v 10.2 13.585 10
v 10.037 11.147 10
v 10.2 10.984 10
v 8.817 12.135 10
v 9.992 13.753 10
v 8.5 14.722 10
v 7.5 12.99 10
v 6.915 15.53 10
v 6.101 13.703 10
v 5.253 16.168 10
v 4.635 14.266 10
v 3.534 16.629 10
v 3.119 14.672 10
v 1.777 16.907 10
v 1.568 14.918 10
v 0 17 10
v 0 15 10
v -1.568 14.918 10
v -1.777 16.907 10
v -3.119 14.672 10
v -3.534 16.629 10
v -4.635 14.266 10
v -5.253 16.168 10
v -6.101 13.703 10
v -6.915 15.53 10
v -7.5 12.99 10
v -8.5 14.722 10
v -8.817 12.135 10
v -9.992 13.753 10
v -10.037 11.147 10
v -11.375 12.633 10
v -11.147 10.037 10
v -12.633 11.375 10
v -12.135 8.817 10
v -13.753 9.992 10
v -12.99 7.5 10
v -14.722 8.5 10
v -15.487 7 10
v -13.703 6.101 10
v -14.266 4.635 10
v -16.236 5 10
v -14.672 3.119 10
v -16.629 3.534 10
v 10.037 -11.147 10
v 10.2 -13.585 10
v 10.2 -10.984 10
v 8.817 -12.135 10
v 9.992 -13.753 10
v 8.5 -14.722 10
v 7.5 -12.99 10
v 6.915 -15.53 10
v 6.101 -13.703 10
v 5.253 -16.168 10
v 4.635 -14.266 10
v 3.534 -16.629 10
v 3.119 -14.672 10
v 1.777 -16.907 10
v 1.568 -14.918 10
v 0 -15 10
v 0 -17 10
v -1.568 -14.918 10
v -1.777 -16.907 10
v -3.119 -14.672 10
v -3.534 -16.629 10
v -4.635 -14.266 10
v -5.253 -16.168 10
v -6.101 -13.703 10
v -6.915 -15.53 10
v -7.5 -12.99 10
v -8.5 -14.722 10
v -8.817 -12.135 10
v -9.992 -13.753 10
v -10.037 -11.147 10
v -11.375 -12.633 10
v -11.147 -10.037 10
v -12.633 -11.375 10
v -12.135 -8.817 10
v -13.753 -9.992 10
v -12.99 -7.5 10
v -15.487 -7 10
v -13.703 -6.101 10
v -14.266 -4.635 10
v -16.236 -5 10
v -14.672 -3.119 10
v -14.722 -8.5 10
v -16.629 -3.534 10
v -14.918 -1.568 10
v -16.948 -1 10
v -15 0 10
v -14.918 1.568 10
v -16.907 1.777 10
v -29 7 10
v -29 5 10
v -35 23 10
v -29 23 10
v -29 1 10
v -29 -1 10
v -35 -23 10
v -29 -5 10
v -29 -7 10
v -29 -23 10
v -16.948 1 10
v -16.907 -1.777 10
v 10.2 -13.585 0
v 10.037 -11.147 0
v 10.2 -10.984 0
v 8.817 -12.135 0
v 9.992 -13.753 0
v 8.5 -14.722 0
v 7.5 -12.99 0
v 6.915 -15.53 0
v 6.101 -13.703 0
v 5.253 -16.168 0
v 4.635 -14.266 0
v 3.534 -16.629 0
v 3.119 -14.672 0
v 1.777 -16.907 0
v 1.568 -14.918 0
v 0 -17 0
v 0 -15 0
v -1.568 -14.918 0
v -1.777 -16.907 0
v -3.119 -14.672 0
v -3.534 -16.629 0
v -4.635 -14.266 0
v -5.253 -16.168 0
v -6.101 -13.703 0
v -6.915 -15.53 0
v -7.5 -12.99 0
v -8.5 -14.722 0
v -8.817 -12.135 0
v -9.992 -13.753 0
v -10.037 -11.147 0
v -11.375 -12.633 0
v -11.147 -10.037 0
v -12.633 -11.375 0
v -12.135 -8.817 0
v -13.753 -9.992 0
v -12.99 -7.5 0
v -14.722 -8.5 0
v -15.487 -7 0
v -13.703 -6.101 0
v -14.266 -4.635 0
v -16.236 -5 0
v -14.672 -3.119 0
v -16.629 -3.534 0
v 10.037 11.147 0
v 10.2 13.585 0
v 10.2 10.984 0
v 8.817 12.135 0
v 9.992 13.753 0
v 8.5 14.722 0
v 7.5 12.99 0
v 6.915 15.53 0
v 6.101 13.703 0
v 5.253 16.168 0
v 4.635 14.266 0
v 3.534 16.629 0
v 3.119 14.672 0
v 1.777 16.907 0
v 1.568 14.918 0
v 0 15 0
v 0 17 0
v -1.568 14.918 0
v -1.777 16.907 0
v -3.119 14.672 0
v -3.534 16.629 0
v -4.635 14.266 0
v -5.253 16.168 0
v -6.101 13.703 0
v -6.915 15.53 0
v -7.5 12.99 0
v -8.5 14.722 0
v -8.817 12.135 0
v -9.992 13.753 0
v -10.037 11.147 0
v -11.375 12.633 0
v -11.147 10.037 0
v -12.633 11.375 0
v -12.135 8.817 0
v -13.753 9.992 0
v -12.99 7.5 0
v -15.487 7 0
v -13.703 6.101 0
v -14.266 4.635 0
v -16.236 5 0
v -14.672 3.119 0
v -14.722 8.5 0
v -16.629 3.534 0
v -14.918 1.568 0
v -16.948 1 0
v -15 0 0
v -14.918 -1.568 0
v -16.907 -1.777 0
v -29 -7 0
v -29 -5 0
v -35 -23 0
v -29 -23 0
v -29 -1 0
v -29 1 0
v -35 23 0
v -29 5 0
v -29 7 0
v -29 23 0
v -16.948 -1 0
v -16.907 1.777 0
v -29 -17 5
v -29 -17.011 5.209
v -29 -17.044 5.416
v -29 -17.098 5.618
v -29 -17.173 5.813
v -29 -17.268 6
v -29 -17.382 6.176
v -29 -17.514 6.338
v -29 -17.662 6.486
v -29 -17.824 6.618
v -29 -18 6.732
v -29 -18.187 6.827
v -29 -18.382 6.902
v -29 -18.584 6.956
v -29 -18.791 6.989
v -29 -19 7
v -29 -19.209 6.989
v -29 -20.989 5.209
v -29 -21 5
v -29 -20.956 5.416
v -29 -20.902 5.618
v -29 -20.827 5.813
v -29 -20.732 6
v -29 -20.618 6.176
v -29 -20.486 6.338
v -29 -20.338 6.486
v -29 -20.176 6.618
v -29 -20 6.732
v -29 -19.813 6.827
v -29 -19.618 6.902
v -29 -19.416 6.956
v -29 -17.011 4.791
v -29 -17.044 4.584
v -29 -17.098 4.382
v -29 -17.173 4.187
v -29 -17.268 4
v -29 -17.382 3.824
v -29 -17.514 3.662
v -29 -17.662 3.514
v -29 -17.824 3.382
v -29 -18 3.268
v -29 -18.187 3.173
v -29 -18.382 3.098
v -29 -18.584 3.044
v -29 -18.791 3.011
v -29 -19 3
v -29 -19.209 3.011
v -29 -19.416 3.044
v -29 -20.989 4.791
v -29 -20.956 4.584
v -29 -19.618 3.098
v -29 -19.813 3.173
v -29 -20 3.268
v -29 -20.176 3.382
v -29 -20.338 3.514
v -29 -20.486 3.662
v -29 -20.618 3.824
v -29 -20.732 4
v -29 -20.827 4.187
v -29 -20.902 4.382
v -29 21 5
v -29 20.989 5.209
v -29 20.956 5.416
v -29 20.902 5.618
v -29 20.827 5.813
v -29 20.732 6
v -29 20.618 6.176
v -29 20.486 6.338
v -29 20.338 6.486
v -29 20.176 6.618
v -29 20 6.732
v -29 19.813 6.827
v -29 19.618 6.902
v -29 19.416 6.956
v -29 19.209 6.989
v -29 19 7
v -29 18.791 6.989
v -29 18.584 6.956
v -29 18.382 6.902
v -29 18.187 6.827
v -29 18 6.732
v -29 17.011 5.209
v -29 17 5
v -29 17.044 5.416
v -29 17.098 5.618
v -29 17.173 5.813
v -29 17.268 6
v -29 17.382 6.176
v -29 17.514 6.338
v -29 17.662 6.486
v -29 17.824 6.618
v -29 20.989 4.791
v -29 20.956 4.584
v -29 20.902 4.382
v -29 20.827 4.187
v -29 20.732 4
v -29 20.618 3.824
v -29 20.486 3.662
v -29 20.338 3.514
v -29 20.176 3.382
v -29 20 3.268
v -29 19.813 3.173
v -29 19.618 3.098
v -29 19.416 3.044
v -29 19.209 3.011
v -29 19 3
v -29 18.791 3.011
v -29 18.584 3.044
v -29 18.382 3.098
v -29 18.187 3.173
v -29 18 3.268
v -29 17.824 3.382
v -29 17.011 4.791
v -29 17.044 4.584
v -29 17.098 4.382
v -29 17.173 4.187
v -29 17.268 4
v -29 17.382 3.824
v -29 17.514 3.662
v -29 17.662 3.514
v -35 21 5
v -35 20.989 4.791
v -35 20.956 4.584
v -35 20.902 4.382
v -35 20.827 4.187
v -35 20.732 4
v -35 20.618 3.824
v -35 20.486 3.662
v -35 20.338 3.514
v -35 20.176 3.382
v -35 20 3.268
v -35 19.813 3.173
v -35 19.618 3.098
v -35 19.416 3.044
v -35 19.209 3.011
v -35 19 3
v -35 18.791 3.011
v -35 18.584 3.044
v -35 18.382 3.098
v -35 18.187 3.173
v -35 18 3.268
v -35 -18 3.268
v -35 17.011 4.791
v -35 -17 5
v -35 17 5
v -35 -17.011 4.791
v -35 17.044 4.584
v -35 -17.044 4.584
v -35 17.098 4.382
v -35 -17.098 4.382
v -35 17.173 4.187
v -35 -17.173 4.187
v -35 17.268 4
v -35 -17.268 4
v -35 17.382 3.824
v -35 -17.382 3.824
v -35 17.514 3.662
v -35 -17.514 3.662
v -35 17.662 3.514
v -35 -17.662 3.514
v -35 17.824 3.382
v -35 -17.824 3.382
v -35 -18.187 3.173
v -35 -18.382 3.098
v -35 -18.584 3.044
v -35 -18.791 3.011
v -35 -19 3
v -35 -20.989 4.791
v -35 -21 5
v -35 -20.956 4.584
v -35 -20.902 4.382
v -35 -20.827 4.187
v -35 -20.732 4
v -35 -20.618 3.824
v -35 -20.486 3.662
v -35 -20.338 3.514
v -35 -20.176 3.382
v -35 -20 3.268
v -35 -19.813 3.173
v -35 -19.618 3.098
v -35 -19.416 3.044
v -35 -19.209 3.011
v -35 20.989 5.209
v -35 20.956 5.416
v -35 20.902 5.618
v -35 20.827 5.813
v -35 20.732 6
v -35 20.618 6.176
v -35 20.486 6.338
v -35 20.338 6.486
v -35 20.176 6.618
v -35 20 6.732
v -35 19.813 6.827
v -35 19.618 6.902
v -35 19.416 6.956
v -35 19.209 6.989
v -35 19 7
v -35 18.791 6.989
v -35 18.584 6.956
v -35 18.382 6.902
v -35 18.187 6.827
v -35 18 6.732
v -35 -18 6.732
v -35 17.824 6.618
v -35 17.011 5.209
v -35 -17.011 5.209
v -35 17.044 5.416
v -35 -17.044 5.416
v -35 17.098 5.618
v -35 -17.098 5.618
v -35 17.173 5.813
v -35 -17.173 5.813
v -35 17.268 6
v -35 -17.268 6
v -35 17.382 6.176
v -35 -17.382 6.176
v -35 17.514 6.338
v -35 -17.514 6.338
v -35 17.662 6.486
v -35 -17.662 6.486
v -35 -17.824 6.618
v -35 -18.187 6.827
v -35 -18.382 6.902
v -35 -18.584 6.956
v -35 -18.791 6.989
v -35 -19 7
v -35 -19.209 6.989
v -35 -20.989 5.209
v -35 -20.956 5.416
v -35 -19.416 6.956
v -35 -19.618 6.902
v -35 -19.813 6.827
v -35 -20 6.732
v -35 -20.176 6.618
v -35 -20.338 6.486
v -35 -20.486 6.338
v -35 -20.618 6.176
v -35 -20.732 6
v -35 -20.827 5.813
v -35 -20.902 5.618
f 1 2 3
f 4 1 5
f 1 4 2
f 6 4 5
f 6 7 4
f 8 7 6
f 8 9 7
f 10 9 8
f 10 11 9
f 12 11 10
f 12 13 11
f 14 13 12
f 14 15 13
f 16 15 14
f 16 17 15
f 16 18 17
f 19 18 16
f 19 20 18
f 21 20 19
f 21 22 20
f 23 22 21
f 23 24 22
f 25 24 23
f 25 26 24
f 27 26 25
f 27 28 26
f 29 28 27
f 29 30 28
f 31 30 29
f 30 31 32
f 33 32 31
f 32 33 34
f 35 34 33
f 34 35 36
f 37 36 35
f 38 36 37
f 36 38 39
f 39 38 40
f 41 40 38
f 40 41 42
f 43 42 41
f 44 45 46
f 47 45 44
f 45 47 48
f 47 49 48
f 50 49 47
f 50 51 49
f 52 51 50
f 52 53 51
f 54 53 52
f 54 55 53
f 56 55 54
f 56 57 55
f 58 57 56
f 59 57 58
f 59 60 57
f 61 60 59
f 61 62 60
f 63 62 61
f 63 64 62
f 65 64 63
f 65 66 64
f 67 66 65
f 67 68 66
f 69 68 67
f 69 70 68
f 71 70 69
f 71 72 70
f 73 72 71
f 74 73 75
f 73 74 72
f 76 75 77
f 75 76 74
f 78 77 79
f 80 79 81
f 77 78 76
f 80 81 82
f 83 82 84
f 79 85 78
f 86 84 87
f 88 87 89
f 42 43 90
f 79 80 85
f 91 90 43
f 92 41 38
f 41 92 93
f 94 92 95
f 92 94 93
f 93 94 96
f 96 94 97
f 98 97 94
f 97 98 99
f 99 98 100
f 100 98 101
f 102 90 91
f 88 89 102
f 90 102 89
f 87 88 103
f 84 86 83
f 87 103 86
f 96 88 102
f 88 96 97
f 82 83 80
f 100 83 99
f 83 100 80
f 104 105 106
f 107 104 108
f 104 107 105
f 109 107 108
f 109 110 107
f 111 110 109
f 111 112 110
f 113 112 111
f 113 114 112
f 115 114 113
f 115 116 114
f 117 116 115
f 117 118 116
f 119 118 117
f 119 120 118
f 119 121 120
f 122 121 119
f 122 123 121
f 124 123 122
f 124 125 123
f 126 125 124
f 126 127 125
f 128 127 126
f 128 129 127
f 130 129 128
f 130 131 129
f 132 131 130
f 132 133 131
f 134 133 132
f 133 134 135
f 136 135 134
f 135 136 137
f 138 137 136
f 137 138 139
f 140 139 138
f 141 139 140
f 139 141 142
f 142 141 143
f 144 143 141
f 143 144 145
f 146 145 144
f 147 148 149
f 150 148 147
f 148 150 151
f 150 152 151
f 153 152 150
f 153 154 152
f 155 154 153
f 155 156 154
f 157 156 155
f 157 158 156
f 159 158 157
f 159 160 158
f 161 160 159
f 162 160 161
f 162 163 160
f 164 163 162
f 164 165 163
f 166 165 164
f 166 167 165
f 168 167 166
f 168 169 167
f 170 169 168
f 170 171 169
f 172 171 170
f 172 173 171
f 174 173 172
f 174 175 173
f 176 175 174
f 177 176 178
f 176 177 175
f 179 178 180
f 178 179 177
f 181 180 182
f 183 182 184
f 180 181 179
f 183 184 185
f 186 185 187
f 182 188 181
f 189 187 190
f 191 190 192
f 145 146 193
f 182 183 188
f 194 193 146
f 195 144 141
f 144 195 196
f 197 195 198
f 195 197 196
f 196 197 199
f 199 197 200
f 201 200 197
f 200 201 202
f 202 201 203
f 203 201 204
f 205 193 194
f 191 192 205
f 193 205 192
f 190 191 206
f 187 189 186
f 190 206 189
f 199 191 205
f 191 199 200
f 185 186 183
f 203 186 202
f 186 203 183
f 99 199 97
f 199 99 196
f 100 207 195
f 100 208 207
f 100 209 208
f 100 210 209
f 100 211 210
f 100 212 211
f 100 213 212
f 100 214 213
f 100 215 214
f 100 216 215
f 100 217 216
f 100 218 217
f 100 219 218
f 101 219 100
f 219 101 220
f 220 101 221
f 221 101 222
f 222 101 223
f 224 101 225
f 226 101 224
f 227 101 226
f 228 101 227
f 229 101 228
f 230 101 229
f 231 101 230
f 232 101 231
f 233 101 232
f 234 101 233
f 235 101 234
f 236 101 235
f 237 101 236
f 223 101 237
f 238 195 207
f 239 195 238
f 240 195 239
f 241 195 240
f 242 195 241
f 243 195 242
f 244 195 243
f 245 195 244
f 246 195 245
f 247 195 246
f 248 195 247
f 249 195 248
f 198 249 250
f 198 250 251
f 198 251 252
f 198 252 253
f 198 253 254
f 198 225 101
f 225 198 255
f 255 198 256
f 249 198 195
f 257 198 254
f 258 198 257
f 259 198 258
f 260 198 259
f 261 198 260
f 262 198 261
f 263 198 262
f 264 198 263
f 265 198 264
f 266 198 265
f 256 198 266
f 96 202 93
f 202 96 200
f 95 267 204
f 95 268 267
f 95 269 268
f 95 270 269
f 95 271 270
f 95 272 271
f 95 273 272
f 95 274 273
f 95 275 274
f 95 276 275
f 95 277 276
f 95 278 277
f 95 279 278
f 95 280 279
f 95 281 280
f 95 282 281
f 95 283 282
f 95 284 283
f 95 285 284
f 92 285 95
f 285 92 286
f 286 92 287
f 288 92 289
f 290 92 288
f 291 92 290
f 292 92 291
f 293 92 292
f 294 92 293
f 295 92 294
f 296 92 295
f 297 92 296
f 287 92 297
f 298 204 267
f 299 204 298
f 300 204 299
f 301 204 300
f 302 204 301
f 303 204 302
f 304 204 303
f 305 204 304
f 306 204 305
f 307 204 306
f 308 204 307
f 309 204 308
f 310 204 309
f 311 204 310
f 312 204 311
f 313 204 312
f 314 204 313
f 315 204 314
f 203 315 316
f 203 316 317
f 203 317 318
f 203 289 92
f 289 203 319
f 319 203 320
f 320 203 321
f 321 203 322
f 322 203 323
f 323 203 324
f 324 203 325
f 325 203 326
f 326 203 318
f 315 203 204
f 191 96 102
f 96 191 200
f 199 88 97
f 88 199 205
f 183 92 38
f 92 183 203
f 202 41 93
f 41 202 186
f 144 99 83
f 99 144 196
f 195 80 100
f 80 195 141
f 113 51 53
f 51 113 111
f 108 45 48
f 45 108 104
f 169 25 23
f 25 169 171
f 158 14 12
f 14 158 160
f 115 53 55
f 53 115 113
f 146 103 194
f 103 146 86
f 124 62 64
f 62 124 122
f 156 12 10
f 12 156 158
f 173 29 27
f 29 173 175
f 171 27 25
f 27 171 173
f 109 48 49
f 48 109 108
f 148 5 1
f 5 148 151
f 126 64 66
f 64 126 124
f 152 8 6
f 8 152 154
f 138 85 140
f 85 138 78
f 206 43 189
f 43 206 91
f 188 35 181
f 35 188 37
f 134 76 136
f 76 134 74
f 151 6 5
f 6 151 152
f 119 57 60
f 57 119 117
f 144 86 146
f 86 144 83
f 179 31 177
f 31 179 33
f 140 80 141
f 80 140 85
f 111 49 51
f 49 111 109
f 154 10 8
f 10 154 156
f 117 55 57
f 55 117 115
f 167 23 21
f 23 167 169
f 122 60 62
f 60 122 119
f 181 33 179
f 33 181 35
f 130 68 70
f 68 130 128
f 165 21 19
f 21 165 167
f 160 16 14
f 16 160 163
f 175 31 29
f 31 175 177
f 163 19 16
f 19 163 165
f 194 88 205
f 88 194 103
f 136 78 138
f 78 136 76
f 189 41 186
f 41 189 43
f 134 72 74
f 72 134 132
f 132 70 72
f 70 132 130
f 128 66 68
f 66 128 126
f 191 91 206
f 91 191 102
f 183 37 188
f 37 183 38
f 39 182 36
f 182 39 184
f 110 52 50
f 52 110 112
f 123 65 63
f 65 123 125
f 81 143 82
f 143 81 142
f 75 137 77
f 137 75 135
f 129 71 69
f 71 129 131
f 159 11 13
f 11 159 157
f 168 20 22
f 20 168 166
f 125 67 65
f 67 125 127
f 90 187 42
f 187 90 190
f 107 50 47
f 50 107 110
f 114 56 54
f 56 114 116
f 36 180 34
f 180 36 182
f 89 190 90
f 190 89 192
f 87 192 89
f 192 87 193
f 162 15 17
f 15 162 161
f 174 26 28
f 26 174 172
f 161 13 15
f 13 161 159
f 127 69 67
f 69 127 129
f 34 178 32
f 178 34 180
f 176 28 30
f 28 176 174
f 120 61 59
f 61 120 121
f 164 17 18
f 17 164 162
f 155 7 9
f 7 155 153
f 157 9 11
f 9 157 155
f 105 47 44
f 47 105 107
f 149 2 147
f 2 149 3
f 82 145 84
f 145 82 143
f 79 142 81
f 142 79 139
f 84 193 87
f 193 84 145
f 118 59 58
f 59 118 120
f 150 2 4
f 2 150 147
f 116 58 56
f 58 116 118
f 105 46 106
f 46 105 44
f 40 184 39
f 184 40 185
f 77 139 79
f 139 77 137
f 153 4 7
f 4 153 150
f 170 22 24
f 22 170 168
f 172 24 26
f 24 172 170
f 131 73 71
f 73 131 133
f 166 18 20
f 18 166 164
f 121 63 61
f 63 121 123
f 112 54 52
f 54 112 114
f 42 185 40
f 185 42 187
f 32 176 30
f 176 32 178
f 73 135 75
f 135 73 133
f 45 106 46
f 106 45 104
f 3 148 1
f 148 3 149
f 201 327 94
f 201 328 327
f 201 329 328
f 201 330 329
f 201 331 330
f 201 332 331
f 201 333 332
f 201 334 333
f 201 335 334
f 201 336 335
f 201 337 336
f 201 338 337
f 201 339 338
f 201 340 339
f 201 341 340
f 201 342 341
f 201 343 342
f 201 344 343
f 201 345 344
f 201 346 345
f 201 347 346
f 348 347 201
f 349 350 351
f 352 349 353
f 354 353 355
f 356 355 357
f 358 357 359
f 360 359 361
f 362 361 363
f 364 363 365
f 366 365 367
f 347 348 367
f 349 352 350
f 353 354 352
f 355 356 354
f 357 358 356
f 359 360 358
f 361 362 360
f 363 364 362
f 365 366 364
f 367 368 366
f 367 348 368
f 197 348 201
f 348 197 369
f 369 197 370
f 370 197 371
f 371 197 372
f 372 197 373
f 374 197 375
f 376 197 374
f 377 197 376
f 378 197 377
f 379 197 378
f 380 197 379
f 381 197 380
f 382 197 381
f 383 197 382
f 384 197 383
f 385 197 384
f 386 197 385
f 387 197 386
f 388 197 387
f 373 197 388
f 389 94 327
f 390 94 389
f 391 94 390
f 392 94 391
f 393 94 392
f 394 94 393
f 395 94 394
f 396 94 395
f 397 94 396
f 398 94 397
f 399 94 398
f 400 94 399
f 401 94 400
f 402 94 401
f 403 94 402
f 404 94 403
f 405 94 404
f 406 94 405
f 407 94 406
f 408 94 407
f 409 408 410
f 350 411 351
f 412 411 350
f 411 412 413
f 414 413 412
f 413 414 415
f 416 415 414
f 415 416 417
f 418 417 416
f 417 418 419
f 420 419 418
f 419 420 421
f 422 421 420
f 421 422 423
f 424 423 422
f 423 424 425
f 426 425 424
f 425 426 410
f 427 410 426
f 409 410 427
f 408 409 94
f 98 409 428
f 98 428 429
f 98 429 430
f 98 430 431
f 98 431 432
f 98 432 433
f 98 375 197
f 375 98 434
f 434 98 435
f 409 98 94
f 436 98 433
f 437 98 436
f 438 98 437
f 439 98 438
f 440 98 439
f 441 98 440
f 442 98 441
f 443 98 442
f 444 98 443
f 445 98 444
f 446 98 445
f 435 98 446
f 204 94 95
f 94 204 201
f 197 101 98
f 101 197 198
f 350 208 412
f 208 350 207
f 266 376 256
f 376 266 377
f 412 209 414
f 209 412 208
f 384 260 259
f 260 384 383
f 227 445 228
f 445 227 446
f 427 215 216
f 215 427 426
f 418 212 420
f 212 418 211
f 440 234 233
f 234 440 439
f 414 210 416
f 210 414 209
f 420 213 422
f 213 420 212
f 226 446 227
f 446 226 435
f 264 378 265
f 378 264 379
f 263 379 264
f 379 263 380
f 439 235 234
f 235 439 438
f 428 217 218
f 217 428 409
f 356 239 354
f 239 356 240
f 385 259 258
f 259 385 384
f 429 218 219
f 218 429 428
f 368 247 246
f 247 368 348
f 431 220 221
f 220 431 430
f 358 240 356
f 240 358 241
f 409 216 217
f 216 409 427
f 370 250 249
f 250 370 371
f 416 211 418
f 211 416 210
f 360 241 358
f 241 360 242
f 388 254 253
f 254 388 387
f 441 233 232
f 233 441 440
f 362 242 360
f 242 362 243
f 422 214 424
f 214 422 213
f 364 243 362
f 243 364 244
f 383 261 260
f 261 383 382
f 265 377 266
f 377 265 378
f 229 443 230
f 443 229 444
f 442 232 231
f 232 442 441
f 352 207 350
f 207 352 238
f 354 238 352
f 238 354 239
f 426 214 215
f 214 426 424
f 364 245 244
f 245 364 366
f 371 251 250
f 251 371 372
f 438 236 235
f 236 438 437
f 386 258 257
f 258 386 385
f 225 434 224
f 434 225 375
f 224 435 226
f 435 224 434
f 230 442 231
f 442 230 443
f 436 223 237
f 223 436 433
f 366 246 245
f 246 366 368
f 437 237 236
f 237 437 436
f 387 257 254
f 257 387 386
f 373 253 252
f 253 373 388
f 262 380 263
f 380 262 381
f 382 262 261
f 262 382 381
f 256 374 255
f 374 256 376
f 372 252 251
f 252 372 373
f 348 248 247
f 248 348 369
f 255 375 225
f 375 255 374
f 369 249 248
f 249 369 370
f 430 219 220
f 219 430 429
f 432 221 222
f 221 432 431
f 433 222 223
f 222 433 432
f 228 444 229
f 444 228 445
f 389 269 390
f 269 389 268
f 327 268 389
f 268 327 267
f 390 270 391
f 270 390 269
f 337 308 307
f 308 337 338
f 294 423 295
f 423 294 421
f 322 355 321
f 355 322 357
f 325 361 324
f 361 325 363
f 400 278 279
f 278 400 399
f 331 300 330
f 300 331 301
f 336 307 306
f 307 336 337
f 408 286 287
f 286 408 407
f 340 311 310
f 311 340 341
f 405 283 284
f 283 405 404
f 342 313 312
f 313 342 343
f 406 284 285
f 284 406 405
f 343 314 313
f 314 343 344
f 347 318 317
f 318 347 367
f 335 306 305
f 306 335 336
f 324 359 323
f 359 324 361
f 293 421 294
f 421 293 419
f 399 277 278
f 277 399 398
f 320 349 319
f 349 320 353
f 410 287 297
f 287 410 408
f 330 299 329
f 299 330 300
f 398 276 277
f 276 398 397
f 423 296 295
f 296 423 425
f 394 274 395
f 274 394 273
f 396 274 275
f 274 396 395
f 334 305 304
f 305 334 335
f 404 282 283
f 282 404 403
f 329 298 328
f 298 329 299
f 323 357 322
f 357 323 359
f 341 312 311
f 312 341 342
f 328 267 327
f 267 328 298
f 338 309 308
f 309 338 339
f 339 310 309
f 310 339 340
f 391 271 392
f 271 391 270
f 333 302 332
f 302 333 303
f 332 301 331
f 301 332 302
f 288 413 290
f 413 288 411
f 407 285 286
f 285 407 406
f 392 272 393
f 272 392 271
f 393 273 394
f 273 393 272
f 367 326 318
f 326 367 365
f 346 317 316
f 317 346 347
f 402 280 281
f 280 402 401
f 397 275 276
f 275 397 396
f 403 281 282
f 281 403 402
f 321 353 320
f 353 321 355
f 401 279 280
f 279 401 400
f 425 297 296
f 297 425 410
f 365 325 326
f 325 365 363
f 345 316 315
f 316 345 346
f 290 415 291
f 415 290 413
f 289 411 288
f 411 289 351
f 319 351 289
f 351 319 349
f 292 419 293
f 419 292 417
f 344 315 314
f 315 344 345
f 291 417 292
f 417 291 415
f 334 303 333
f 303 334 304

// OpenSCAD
/*kitchen plinth clip feb 2016 Glyn Cowles */
// diameter of pole
diam=30;
// clip height
ht=10; 
//percentage amount to cut off circle to form clip
cutpc=20;
// length to plinth from pole
len=20;
// thickness of clip
th=2; 
// diam of screw holes
holed=4; 
// base depth
based=6; 
holex=diam+th*2+holed; // distance apart of holes
basew=holex+holed*2; // screw part base width

$fn=60;
assemble();



//-------------------------------------------------
module assemble() {
    clip();     
    translate([-diam/2-len,-basew/2,0]) screwpart();     
}
 
//-------------------------------------------------
module clip() { 
    cut=(diam+2*th)*(cutpc/100);
    difference() {
        union() {
            rotate([0,0,0]) translate([-diam/2-len+based,-th/2,0]) strut();
            cylinder(r=diam/2+th,h=ht);
            }
        cylinder(r=diam/2,h=ht);
        translate([-cut+diam/2+th,-diam/2-th,0]) cube([diam,diam+th*2,ht]);
    }
}
//-------------------------------------------------
module strut() {
    cube([len,th,ht]);
    translate([0,th*3,0]) cube([len,th,ht]);
    translate([0,-th*3,0]) cube([len,th,ht]);
}
//-------------------------------------------------
module screwpart() {
    difference() {
        cube([based,basew,ht]);
        translate([0,-holex/2+basew/2,ht/2]) hol();
        translate([0,holex/2+basew/2,ht/2]) hol();
    }    
}
//-------------------------------------------------
module hol() {
    rotate([90,0,90]) cylinder(h=based,r=holed/2);   
}
//-------------------------------------------------
